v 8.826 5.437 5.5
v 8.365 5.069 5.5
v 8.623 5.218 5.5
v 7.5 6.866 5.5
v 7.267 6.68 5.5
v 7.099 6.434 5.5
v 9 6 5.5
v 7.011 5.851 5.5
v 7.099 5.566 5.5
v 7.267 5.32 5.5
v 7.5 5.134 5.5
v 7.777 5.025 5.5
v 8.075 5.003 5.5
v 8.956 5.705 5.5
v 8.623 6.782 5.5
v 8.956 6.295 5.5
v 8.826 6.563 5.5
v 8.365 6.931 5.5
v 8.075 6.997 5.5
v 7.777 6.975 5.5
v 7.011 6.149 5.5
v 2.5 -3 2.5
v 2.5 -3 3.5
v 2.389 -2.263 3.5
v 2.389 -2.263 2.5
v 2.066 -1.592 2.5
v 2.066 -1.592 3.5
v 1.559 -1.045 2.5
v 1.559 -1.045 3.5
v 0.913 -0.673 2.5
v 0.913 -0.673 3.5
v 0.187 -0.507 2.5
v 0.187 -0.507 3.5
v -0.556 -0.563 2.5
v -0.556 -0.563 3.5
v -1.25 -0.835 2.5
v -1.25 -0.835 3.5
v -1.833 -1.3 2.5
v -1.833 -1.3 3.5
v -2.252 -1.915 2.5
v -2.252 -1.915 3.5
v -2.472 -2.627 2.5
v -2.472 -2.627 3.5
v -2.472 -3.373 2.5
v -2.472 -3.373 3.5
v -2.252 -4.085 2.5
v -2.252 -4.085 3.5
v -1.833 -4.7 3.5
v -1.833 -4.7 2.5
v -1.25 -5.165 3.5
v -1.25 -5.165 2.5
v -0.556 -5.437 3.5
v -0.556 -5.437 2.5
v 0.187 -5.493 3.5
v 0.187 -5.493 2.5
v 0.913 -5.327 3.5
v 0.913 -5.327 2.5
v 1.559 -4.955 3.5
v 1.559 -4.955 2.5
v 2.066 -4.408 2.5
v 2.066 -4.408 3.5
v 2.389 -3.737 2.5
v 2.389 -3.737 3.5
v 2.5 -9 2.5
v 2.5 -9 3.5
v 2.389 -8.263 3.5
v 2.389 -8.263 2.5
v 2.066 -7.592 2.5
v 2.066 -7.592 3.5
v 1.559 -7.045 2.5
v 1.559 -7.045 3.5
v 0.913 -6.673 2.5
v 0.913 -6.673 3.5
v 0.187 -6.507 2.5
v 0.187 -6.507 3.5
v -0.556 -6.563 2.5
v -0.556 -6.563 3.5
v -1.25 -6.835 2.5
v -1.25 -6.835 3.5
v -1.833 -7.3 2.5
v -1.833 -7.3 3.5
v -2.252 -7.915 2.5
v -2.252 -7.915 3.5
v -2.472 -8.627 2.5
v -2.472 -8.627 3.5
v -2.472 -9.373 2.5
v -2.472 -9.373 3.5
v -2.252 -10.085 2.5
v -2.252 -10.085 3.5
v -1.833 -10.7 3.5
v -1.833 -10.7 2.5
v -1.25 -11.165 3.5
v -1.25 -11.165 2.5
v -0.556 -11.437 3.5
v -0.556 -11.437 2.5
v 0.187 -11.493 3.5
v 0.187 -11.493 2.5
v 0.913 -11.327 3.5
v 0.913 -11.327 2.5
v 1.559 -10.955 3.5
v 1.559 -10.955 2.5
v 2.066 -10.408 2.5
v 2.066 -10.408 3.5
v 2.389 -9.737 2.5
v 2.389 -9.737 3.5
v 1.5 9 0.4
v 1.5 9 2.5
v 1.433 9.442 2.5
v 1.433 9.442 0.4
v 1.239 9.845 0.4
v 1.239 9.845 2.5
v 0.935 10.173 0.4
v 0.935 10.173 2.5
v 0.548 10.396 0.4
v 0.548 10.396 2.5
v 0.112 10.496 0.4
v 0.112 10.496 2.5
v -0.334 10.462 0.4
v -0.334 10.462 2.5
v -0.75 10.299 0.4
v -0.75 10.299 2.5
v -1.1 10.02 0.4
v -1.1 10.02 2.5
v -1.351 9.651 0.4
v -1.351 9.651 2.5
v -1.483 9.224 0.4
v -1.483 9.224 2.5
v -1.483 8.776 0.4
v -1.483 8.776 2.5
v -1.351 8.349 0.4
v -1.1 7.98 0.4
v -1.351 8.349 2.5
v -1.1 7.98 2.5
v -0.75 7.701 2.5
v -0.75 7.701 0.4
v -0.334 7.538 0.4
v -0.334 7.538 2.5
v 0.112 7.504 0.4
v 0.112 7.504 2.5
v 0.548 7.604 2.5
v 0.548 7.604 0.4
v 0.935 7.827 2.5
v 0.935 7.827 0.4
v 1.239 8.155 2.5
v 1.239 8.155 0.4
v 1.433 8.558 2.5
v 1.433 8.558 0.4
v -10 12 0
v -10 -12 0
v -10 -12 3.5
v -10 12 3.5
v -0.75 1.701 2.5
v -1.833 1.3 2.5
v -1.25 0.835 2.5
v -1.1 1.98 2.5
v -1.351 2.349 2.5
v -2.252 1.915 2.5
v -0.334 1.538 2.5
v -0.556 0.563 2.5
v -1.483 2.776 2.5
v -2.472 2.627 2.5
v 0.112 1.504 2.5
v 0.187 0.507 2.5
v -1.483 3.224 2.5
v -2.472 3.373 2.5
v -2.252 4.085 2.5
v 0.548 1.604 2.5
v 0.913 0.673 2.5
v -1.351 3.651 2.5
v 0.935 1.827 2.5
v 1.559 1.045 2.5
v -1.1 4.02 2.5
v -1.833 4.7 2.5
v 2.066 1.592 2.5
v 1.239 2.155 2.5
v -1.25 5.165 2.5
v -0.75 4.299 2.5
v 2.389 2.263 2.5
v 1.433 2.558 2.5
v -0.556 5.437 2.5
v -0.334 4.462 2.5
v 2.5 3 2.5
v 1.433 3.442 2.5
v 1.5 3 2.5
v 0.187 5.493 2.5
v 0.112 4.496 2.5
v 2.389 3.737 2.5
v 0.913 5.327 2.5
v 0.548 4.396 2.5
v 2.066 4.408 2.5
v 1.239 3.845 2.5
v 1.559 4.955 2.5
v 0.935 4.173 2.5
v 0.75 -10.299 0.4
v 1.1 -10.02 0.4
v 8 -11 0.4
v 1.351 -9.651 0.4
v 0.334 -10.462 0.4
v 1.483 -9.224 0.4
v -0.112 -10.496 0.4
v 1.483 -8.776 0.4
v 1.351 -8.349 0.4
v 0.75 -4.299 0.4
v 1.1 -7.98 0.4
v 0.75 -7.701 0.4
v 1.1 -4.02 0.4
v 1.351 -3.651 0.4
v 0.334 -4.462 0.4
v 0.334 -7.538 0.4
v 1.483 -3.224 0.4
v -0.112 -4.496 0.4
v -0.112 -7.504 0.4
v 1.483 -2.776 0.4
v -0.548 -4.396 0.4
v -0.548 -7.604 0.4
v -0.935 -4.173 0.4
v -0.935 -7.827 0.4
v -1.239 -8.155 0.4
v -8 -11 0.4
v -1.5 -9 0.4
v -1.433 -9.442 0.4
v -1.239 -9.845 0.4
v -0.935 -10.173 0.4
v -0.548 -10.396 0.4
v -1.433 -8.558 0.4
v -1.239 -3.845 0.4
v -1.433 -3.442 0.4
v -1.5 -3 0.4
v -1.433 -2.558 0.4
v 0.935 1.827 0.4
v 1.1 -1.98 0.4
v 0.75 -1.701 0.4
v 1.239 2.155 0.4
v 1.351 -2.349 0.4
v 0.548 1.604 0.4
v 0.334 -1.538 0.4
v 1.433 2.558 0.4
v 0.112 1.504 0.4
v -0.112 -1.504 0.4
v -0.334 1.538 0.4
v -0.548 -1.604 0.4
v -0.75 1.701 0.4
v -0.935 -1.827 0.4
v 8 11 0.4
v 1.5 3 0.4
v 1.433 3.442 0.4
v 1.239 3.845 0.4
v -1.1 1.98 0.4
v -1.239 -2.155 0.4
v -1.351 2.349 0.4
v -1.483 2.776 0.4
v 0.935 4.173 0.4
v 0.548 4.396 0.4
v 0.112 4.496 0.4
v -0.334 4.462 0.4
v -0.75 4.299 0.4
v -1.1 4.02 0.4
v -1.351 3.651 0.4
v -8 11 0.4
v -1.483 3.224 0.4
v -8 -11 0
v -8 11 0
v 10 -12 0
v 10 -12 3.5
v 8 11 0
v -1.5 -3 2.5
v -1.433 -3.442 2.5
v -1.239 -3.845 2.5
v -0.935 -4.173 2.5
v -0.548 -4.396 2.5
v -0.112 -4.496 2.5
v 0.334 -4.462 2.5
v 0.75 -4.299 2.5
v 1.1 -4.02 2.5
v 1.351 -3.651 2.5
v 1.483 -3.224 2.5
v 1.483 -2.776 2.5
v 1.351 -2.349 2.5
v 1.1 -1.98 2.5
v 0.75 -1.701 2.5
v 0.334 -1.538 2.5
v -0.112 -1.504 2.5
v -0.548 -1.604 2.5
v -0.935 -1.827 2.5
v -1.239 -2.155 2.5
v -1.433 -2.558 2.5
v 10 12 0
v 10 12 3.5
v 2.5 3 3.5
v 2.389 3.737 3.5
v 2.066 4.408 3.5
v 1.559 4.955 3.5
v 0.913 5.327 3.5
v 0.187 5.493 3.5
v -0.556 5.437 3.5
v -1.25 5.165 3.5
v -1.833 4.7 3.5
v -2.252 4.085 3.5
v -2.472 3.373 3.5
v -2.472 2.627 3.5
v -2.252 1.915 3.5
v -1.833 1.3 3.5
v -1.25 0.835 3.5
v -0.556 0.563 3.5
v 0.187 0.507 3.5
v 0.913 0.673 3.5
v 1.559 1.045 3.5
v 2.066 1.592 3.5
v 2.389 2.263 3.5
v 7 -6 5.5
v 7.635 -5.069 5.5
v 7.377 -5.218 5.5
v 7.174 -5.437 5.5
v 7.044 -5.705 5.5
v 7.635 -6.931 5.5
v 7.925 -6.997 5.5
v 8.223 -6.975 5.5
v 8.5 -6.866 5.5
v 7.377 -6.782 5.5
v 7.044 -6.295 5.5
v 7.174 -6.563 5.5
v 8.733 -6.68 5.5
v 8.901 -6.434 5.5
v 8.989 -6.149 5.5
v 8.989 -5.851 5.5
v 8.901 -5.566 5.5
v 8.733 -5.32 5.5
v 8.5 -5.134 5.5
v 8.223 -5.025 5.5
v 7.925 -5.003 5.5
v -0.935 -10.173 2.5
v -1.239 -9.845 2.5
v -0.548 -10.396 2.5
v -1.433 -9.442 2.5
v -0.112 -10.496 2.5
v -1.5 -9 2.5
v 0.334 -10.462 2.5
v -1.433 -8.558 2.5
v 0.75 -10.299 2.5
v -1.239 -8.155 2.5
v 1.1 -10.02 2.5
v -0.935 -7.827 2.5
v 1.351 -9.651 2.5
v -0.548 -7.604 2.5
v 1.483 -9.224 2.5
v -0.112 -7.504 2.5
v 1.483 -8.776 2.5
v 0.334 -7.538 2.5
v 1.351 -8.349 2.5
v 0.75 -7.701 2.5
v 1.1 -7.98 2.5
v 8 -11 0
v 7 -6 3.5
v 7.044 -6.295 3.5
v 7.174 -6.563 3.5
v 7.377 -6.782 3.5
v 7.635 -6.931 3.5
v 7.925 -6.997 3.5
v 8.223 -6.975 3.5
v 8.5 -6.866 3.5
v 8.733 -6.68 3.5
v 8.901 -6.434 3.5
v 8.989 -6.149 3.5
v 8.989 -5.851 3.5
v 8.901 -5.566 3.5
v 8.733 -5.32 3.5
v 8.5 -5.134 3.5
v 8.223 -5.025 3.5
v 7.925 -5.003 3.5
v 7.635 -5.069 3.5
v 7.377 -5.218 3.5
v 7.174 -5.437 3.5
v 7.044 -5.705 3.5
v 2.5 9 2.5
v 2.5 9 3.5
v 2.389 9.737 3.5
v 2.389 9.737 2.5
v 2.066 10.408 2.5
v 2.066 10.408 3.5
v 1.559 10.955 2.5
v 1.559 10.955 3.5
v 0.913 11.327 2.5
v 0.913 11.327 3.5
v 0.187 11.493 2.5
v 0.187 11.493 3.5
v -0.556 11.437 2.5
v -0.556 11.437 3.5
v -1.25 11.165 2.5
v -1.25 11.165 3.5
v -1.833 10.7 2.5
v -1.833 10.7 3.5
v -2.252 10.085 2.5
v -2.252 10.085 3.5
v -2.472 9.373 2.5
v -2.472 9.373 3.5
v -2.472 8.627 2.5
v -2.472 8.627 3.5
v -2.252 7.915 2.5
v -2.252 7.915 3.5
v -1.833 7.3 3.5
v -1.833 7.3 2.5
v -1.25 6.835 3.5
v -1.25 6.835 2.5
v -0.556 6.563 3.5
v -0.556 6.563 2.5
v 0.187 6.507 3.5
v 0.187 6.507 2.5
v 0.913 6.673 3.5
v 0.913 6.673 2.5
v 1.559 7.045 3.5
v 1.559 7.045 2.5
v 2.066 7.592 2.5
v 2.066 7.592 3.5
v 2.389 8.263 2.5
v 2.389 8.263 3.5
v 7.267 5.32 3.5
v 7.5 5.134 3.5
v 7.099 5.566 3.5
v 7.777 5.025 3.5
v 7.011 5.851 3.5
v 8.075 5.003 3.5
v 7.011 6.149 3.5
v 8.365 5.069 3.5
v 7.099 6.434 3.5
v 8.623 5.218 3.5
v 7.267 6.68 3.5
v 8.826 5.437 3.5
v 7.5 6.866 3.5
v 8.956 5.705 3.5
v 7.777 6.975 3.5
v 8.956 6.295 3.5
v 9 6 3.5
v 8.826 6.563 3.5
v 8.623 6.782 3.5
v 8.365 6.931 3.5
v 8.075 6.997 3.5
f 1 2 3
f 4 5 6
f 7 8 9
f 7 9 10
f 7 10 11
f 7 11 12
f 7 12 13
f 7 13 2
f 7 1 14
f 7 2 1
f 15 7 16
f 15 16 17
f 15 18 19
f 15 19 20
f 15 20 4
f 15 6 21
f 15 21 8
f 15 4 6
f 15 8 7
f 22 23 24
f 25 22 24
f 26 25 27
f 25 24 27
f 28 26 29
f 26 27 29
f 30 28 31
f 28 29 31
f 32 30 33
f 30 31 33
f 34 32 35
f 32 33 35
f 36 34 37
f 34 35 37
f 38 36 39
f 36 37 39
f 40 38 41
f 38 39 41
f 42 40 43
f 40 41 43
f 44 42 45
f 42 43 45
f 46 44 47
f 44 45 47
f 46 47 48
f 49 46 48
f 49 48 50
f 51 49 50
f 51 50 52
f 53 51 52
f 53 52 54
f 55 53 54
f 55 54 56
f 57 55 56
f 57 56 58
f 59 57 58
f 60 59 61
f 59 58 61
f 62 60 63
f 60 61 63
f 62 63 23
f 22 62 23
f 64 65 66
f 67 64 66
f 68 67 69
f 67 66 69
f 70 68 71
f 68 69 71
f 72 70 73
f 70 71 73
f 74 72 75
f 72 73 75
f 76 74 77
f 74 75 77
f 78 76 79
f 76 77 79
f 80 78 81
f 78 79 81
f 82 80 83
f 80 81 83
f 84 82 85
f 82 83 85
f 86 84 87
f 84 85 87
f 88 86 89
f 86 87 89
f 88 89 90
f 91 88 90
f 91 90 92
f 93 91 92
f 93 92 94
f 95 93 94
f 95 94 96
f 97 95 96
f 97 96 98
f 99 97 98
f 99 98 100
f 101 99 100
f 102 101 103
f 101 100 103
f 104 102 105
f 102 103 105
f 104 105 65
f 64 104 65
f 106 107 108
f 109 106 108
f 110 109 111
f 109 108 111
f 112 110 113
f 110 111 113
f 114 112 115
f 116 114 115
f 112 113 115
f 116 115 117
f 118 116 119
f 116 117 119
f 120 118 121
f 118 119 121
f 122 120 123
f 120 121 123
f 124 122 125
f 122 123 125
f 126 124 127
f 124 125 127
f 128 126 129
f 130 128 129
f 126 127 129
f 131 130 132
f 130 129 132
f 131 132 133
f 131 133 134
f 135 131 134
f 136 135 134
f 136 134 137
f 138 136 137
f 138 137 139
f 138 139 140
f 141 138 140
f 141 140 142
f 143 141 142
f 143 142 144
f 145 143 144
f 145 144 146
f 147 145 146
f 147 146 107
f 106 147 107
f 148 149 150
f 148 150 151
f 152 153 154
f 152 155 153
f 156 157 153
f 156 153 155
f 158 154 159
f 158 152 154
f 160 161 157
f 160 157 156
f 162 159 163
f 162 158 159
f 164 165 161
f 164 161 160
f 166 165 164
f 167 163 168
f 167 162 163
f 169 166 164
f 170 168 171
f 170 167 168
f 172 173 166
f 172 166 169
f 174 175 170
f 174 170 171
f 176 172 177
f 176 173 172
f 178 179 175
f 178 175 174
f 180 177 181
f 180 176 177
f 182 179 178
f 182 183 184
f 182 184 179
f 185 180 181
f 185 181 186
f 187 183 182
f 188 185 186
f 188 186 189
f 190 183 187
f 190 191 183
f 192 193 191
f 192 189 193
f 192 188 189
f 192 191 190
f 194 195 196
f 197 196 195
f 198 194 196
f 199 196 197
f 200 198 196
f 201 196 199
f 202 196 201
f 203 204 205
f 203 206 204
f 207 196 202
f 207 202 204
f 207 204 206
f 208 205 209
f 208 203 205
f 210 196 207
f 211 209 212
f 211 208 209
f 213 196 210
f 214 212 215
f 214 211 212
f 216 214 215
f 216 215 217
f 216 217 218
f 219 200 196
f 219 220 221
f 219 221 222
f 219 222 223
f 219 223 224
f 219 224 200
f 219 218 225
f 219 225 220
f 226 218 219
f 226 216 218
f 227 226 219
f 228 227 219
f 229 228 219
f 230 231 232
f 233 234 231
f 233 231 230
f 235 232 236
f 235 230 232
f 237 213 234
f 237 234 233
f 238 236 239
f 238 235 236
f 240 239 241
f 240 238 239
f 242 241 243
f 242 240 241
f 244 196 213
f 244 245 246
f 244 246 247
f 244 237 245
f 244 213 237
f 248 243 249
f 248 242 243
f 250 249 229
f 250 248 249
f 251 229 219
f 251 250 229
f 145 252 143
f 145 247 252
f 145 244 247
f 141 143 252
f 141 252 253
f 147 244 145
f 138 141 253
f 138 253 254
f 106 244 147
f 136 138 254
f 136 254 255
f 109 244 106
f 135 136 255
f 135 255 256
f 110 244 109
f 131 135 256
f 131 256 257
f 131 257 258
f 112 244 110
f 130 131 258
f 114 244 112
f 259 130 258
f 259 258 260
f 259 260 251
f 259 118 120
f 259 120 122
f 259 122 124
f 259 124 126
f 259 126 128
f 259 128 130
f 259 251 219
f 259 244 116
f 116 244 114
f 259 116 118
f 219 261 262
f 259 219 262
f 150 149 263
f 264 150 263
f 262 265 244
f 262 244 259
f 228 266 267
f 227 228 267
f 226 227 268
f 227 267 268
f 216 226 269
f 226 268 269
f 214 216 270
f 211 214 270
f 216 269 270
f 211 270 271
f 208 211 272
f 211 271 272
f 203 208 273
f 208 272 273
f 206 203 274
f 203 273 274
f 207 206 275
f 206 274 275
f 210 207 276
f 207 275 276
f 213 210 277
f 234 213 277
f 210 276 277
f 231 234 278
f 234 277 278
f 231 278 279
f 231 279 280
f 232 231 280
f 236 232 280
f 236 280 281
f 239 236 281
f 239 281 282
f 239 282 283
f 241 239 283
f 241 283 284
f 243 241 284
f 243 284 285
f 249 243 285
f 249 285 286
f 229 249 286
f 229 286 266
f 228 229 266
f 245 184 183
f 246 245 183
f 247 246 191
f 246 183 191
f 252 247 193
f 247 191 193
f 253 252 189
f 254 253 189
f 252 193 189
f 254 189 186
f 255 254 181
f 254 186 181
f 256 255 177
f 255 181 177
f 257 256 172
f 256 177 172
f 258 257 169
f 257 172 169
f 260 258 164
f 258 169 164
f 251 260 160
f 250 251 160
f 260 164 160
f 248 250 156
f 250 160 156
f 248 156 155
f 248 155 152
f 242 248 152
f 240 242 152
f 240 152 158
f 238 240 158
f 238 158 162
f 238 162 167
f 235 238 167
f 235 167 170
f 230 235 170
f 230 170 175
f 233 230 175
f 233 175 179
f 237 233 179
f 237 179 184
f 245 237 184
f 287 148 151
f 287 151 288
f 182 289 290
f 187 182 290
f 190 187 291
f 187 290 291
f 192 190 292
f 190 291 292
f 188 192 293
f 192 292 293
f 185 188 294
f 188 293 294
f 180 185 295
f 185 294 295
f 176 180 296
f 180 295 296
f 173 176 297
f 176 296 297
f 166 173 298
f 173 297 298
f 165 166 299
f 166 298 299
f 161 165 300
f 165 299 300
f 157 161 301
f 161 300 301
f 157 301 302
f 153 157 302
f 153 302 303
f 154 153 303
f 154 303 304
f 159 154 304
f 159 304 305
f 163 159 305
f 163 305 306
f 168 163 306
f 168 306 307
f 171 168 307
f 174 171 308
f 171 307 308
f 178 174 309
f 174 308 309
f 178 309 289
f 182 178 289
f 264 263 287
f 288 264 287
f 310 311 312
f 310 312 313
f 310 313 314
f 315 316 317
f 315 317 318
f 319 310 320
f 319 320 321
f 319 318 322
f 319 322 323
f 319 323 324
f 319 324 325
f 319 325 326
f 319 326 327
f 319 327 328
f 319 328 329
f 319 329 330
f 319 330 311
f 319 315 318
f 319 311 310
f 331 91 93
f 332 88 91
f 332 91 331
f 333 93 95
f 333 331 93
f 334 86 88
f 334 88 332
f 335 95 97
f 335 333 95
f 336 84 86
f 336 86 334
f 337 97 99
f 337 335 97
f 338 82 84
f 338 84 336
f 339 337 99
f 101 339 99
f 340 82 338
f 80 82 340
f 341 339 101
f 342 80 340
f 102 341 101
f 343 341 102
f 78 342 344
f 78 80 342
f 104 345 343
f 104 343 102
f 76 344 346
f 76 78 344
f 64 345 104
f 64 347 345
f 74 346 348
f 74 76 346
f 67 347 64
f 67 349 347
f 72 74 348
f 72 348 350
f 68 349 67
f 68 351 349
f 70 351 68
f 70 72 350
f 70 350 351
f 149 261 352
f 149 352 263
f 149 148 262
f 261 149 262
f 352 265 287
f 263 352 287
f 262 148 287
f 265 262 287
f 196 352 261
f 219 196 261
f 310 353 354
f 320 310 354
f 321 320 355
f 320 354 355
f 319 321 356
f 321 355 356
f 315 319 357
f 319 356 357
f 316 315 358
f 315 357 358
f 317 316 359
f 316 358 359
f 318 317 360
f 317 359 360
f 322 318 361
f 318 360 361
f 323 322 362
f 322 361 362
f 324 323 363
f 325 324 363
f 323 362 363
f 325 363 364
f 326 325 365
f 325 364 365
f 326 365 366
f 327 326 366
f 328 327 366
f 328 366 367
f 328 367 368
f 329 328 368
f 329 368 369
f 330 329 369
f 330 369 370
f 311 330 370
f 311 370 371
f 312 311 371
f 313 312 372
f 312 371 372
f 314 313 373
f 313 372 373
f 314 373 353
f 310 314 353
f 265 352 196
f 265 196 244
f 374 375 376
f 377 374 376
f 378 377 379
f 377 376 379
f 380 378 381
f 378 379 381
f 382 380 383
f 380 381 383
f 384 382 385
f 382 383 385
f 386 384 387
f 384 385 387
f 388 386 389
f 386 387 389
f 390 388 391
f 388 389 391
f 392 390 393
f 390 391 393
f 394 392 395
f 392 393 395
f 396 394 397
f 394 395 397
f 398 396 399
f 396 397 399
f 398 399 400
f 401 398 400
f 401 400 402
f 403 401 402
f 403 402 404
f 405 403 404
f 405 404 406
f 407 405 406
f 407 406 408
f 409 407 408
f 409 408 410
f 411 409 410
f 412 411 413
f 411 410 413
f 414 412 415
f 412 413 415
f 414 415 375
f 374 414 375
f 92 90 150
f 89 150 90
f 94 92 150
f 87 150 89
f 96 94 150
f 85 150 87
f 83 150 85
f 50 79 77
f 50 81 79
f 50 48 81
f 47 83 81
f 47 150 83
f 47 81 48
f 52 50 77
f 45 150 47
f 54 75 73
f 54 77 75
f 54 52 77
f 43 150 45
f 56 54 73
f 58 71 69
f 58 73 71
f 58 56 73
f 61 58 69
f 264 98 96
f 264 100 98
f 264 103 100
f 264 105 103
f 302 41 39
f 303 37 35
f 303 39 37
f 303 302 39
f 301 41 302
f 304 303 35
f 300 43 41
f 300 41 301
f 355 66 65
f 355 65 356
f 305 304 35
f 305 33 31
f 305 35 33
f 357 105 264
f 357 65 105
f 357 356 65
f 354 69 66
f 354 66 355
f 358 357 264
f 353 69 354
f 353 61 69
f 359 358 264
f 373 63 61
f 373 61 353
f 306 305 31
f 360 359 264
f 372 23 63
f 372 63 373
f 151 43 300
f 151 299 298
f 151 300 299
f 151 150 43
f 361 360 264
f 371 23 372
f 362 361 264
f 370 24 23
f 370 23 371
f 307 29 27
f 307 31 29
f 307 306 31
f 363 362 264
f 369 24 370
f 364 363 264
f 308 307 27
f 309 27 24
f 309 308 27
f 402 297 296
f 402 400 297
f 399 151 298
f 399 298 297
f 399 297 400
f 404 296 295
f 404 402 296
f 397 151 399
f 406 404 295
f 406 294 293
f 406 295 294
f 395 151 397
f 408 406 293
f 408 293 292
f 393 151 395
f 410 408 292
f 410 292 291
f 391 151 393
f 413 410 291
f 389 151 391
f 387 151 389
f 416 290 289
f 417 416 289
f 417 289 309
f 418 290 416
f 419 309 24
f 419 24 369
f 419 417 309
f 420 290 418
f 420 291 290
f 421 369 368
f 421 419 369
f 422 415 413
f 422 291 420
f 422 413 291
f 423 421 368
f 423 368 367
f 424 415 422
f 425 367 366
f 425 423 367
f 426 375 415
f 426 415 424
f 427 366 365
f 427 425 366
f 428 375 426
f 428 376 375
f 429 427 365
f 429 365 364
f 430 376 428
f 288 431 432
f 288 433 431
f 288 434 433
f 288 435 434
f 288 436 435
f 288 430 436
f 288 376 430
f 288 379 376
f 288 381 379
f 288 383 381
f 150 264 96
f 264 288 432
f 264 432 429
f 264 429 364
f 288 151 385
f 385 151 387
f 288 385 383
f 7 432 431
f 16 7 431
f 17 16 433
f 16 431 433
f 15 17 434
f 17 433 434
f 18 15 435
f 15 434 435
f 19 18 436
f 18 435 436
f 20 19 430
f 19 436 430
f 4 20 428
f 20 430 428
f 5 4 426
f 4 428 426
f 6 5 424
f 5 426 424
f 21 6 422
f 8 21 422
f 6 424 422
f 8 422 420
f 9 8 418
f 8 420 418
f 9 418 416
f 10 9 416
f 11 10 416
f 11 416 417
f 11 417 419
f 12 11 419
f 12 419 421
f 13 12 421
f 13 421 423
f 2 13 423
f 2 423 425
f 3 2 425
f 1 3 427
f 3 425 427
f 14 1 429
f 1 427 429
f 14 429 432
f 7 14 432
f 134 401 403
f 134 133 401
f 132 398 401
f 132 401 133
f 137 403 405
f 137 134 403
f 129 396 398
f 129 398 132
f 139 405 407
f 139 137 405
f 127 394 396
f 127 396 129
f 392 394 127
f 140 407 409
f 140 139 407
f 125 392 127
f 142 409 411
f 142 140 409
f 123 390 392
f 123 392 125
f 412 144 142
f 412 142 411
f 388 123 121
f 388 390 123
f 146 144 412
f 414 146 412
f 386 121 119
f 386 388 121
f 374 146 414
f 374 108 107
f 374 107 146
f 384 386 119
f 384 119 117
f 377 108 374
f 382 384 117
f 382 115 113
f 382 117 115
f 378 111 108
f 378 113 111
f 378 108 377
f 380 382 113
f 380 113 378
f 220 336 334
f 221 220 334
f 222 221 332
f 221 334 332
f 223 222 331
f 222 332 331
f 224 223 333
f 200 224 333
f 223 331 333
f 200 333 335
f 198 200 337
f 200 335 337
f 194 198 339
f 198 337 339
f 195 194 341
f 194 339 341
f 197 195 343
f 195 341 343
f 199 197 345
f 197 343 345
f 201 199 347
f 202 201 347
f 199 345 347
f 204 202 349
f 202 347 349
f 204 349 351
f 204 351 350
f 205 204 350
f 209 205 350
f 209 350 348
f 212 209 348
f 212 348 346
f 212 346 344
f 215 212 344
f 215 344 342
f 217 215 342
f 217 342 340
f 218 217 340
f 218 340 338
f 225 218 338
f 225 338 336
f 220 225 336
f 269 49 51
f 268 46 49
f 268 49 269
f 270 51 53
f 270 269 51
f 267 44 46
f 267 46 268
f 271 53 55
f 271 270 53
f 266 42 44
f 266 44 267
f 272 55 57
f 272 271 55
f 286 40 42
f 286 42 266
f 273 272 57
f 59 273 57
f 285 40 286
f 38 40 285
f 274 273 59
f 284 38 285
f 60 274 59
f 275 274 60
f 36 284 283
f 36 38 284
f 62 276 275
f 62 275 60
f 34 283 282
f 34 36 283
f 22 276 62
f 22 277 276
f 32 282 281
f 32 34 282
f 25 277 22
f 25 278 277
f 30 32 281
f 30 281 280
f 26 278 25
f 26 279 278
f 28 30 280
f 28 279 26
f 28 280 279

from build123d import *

# Parameters (mm, degrees)
SKETCH1_W           = 20
SKETCH1_H           = 24
BOSS_EXTRUDE1_DEPTH = 3.5
SKETCH2_W           = 16
SKETCH2_H           = 22
CUT_EXTRUDE1_DEPTH  = 0.4
SKETCH3_R           = 1.5
CUT_EXTRUDE2_DEPTH  = 17.007810594
SKETCH4_R           = 2.5
CUT_EXTRUDE3_DEPTH  = 1
SKETCH5_R           = 1
BOSS_EXTRUDE2_DEPTH = 2


with BuildPart() as part:
    # Sketch1 → Boss-Extrude1 (new body)
    with BuildSketch(Plane.XY):
        Rectangle(SKETCH1_W, SKETCH1_H)
    extrude(amount=BOSS_EXTRUDE1_DEPTH)

    # Sketch2 → Cut-Extrude1 (cut)
    with BuildSketch(Plane(origin=(0, 0, 0), x_dir=(-1, 0, 0), z_dir=(0, 0, -1))):
        Rectangle(SKETCH2_W, SKETCH2_H)
    extrude(amount=-CUT_EXTRUDE1_DEPTH, mode=Mode.SUBTRACT)

    # Sketch3 → Cut-Extrude2 (cut, through all)
    with BuildSketch(Plane.XY.offset(3.5)):
        with Locations((0, 3)):
            Circle(SKETCH3_R)
        with Locations((0, 9)):
            Circle(SKETCH3_R)
        with Locations(Location((0, -9, 0), (0, 0, 180))):
            Circle(SKETCH3_R)
        with Locations(Location((0, -3, 0), (0, 0, 180))):
            Circle(SKETCH3_R)
    extrude(amount=-CUT_EXTRUDE2_DEPTH, mode=Mode.SUBTRACT)

    # Sketch4 → Cut-Extrude3 (cut)
    with BuildSketch(Plane.XY.offset(3.5)):
        with Locations((0, 9)):
            Circle(SKETCH4_R)
    cut_extrude3 = extrude(amount=-CUT_EXTRUDE3_DEPTH, mode=Mode.SUBTRACT)

    # Sketch-Pattern1: Cut-Extrude3 at 3 more places
    with Locations((0, -6, 0), (0, -12, 0), (0, -18, 0)):
        add(cut_extrude3, mode=Mode.SUBTRACT)

    # Sketch5 → Boss-Extrude2 (add)
    with BuildSketch(Plane.XY.offset(3.5)):
        with Locations((8, 6)):
            Circle(SKETCH5_R)
        with Locations(Location((8, -6, 0), (0, 0, 180))):
            Circle(SKETCH5_R)
    extrude(amount=BOSS_EXTRUDE2_DEPTH)


solid = part.part
